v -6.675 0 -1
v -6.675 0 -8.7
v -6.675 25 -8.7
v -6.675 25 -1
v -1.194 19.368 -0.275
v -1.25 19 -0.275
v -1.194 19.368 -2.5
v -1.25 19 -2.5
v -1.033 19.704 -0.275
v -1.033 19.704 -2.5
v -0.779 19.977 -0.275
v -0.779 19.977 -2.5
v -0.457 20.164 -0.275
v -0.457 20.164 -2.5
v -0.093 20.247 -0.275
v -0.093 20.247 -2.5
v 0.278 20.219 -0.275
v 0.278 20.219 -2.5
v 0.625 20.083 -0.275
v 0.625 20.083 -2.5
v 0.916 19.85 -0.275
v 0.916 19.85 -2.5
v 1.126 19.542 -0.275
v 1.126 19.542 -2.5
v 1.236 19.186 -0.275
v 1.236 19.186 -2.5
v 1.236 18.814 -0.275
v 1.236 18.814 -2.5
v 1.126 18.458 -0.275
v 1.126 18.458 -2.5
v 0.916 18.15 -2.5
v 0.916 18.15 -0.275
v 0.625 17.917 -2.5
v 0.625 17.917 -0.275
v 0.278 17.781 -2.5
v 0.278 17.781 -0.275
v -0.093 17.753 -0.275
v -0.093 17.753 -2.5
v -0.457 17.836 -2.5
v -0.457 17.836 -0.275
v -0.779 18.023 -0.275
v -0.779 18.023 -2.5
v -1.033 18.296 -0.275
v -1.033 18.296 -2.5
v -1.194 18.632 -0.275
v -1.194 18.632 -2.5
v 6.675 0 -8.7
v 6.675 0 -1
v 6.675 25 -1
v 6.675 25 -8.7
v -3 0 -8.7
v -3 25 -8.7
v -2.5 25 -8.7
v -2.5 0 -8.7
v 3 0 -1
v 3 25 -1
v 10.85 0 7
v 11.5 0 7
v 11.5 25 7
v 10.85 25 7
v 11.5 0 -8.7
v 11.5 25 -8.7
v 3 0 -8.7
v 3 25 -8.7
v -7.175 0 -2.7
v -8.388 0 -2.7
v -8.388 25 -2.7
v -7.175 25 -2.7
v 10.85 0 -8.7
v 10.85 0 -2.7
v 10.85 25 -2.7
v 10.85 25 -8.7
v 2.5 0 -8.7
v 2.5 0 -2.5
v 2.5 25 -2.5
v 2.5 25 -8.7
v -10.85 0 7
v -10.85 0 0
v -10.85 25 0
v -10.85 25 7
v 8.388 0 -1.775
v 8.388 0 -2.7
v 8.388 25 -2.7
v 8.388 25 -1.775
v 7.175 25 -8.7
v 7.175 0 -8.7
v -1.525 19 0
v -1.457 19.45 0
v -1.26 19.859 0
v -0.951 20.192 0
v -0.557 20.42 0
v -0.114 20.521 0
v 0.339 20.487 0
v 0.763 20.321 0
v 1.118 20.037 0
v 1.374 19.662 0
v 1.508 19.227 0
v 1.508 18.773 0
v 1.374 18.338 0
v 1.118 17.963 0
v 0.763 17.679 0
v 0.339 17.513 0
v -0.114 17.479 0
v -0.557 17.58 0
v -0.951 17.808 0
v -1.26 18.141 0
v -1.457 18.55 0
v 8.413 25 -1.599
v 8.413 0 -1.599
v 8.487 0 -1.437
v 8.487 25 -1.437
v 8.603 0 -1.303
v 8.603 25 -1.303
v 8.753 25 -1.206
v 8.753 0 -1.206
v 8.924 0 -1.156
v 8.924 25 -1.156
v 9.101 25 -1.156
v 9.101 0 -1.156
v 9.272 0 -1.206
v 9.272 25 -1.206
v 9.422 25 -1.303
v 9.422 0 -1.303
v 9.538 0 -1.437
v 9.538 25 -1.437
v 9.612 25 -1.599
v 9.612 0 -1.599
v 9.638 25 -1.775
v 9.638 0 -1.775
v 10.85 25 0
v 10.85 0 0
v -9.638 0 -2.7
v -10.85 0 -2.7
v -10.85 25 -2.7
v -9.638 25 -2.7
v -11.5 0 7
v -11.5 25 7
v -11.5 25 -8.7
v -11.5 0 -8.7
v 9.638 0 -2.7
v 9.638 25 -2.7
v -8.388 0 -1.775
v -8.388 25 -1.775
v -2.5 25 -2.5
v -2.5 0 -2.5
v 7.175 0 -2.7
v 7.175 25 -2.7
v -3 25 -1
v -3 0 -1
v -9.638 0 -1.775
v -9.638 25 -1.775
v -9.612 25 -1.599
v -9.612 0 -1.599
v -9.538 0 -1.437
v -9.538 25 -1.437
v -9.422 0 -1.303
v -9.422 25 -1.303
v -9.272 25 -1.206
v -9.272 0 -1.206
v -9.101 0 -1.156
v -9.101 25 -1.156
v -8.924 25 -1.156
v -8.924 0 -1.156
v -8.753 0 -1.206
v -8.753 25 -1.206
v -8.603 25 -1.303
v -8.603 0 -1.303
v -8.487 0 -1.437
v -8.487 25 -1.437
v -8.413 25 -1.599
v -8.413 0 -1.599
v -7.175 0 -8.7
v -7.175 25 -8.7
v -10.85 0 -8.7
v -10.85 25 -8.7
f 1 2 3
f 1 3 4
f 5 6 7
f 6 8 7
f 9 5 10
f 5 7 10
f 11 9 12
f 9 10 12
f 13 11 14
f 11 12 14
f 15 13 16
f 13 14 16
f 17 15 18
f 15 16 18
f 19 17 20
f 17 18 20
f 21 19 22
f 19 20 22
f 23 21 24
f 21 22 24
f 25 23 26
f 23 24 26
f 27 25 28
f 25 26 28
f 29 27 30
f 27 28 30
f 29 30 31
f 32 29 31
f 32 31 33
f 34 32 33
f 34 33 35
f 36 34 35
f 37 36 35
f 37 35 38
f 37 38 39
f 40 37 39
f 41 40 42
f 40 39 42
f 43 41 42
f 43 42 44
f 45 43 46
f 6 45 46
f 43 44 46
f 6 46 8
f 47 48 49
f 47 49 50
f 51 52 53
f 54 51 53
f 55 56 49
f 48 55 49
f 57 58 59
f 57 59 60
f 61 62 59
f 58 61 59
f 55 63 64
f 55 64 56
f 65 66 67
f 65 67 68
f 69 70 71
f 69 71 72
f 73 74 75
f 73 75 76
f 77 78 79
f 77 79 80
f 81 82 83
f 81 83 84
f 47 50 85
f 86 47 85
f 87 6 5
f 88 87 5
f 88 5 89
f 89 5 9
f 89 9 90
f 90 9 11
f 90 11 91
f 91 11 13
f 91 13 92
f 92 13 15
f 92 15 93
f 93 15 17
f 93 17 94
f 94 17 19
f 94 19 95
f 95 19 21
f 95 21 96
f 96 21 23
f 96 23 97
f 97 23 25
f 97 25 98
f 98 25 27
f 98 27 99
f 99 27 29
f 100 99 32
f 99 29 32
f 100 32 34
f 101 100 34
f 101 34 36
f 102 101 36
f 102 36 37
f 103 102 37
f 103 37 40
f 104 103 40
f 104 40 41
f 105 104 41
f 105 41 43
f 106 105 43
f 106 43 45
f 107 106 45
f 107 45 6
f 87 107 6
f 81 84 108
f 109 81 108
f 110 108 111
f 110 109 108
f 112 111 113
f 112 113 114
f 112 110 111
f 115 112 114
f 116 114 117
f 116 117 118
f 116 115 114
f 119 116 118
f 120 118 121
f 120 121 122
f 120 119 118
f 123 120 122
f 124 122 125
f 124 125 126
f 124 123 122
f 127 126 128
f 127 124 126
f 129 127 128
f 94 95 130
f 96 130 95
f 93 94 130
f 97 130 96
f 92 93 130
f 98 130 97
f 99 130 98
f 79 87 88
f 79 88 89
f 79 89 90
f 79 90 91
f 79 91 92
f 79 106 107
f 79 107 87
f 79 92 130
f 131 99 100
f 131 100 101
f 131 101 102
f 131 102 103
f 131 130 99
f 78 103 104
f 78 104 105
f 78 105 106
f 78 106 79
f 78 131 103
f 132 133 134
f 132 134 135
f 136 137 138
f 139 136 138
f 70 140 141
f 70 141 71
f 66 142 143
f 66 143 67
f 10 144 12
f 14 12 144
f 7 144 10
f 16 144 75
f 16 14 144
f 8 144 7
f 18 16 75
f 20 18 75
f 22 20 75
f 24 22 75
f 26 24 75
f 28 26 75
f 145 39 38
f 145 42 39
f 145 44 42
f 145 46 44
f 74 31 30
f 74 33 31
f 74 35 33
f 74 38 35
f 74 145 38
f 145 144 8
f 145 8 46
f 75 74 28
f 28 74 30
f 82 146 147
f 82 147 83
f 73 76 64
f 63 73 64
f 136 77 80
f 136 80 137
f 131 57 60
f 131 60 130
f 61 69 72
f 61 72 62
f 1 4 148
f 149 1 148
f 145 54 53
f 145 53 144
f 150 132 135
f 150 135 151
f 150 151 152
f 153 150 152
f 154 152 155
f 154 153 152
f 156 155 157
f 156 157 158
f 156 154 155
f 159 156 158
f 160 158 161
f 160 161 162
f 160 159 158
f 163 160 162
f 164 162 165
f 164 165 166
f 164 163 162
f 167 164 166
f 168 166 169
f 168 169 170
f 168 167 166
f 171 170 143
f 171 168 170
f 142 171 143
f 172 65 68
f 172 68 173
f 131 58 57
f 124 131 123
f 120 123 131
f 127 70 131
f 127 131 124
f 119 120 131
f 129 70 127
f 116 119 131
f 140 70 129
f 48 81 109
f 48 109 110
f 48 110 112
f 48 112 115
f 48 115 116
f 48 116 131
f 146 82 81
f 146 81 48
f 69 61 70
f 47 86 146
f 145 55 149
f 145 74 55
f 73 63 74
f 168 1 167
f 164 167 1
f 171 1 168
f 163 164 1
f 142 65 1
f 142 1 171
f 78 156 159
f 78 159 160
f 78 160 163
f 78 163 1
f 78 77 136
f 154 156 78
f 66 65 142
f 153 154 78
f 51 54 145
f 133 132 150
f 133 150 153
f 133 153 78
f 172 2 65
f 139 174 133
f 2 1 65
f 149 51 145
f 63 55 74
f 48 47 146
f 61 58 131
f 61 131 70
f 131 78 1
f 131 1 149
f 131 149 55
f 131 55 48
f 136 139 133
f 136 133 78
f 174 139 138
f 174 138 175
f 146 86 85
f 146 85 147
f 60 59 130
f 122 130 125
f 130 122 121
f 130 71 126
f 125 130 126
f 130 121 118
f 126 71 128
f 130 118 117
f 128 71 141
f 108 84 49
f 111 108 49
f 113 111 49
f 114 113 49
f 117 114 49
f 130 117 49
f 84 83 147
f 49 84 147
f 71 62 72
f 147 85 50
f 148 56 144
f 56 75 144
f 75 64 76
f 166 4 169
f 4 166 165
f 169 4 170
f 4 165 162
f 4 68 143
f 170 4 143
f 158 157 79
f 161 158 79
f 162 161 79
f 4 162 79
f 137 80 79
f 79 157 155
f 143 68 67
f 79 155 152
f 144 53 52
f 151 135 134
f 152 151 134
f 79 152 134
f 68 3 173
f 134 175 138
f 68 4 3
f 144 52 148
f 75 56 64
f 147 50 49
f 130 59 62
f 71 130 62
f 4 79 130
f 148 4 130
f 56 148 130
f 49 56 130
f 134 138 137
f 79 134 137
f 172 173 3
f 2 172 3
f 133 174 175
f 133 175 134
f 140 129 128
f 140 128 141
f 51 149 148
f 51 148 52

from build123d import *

# Parameters (mm, degrees)
BOSS_EXTRUDE1_DEPTH         = 25
M3_TAPPED_HOLE1_D           = 2.5
M3_TAPPED_HOLE1_CSINK_D     = 3.05
M3_TAPPED_HOLE1_CSINK_ANGLE = 90


with BuildPart() as part:
    # Sketch1 → Boss-Extrude1 (new body)
    with BuildSketch(Plane(origin=(0, 0, 0), x_dir=(1, 0, 0), z_dir=(0, 1, 0))):
        with BuildLine():
            Line((-11.5, 8.7), (-10.85, 8.7))
            Line((-10.85, 8.7), (-10.85, 2.7))
            Line((-10.85, 2.7), (-9.6375, 2.7))
            Line((-9.6375, 2.7), (-9.6375, 1.775))
            ThreePointArc((-9.6375, 1.775), (-9.0125, 1.15), (-8.3875, 1.775))
            Line((-8.3875, 1.775), (-8.3875, 2.7))
            Line((-8.3875, 2.7), (-7.175, 2.7))
            Line((-7.175, 2.7), (-7.175, 8.7))
            Line((-7.175, 8.7), (-6.675, 8.7))
            Line((-6.675, 8.7), (-6.675, 1))
            Line((-6.675, 1), (-3, 1))
            Line((-3, 1), (-3, 8.7))
            Line((-3, 8.7), (-2.5, 8.7))
            Line((-2.5, 8.7), (-2.5, 2.5))
            Line((-2.5, 2.5), (2.5, 2.5))
            Line((2.5, 2.5), (2.5, 8.7))
            Line((2.5, 8.7), (3, 8.7))
            Line((3, 8.7), (3, 1))
            Line((3, 1), (6.675, 1))
            Line((6.675, 1), (6.675, 8.7))
            Line((6.675, 8.7), (7.175, 8.7))
            Line((7.175, 8.7), (7.175, 2.7))
            Line((7.175, 2.7), (8.3875, 2.7))
            Line((8.3875, 2.7), (8.3875, 1.775))
            ThreePointArc((8.3875, 1.775), (9.0125, 1.15), (9.6375, 1.775))
            Line((9.6375, 1.775), (9.6375, 2.7))
            Line((9.6375, 2.7), (10.85, 2.7))
            Line((10.85, 2.7), (10.85, 8.7))
            Line((10.85, 8.7), (11.5, 8.7))
            Line((11.5, 8.7), (11.5, -7))
            Line((11.5, -7), (10.85, -7))
            Line((10.85, -7), (10.85, 0))
            Line((10.85, 0), (-10.85, 0))
            Line((-10.85, 0), (-10.85, -7))
            Line((-10.85, -7), (-11.5, -7))
            Line((-11.5, -7), (-11.5, 8.7))
        make_face()
    extrude(amount=BOSS_EXTRUDE1_DEPTH)

    # M3 Tapped Hole1 (through all)
    with Locations(Plane.XY):
        with Locations((0, 19)):
            CounterSinkHole(M3_TAPPED_HOLE1_D / 2, M3_TAPPED_HOLE1_CSINK_D / 2, counter_sink_angle=M3_TAPPED_HOLE1_CSINK_ANGLE)


solid = part.part
